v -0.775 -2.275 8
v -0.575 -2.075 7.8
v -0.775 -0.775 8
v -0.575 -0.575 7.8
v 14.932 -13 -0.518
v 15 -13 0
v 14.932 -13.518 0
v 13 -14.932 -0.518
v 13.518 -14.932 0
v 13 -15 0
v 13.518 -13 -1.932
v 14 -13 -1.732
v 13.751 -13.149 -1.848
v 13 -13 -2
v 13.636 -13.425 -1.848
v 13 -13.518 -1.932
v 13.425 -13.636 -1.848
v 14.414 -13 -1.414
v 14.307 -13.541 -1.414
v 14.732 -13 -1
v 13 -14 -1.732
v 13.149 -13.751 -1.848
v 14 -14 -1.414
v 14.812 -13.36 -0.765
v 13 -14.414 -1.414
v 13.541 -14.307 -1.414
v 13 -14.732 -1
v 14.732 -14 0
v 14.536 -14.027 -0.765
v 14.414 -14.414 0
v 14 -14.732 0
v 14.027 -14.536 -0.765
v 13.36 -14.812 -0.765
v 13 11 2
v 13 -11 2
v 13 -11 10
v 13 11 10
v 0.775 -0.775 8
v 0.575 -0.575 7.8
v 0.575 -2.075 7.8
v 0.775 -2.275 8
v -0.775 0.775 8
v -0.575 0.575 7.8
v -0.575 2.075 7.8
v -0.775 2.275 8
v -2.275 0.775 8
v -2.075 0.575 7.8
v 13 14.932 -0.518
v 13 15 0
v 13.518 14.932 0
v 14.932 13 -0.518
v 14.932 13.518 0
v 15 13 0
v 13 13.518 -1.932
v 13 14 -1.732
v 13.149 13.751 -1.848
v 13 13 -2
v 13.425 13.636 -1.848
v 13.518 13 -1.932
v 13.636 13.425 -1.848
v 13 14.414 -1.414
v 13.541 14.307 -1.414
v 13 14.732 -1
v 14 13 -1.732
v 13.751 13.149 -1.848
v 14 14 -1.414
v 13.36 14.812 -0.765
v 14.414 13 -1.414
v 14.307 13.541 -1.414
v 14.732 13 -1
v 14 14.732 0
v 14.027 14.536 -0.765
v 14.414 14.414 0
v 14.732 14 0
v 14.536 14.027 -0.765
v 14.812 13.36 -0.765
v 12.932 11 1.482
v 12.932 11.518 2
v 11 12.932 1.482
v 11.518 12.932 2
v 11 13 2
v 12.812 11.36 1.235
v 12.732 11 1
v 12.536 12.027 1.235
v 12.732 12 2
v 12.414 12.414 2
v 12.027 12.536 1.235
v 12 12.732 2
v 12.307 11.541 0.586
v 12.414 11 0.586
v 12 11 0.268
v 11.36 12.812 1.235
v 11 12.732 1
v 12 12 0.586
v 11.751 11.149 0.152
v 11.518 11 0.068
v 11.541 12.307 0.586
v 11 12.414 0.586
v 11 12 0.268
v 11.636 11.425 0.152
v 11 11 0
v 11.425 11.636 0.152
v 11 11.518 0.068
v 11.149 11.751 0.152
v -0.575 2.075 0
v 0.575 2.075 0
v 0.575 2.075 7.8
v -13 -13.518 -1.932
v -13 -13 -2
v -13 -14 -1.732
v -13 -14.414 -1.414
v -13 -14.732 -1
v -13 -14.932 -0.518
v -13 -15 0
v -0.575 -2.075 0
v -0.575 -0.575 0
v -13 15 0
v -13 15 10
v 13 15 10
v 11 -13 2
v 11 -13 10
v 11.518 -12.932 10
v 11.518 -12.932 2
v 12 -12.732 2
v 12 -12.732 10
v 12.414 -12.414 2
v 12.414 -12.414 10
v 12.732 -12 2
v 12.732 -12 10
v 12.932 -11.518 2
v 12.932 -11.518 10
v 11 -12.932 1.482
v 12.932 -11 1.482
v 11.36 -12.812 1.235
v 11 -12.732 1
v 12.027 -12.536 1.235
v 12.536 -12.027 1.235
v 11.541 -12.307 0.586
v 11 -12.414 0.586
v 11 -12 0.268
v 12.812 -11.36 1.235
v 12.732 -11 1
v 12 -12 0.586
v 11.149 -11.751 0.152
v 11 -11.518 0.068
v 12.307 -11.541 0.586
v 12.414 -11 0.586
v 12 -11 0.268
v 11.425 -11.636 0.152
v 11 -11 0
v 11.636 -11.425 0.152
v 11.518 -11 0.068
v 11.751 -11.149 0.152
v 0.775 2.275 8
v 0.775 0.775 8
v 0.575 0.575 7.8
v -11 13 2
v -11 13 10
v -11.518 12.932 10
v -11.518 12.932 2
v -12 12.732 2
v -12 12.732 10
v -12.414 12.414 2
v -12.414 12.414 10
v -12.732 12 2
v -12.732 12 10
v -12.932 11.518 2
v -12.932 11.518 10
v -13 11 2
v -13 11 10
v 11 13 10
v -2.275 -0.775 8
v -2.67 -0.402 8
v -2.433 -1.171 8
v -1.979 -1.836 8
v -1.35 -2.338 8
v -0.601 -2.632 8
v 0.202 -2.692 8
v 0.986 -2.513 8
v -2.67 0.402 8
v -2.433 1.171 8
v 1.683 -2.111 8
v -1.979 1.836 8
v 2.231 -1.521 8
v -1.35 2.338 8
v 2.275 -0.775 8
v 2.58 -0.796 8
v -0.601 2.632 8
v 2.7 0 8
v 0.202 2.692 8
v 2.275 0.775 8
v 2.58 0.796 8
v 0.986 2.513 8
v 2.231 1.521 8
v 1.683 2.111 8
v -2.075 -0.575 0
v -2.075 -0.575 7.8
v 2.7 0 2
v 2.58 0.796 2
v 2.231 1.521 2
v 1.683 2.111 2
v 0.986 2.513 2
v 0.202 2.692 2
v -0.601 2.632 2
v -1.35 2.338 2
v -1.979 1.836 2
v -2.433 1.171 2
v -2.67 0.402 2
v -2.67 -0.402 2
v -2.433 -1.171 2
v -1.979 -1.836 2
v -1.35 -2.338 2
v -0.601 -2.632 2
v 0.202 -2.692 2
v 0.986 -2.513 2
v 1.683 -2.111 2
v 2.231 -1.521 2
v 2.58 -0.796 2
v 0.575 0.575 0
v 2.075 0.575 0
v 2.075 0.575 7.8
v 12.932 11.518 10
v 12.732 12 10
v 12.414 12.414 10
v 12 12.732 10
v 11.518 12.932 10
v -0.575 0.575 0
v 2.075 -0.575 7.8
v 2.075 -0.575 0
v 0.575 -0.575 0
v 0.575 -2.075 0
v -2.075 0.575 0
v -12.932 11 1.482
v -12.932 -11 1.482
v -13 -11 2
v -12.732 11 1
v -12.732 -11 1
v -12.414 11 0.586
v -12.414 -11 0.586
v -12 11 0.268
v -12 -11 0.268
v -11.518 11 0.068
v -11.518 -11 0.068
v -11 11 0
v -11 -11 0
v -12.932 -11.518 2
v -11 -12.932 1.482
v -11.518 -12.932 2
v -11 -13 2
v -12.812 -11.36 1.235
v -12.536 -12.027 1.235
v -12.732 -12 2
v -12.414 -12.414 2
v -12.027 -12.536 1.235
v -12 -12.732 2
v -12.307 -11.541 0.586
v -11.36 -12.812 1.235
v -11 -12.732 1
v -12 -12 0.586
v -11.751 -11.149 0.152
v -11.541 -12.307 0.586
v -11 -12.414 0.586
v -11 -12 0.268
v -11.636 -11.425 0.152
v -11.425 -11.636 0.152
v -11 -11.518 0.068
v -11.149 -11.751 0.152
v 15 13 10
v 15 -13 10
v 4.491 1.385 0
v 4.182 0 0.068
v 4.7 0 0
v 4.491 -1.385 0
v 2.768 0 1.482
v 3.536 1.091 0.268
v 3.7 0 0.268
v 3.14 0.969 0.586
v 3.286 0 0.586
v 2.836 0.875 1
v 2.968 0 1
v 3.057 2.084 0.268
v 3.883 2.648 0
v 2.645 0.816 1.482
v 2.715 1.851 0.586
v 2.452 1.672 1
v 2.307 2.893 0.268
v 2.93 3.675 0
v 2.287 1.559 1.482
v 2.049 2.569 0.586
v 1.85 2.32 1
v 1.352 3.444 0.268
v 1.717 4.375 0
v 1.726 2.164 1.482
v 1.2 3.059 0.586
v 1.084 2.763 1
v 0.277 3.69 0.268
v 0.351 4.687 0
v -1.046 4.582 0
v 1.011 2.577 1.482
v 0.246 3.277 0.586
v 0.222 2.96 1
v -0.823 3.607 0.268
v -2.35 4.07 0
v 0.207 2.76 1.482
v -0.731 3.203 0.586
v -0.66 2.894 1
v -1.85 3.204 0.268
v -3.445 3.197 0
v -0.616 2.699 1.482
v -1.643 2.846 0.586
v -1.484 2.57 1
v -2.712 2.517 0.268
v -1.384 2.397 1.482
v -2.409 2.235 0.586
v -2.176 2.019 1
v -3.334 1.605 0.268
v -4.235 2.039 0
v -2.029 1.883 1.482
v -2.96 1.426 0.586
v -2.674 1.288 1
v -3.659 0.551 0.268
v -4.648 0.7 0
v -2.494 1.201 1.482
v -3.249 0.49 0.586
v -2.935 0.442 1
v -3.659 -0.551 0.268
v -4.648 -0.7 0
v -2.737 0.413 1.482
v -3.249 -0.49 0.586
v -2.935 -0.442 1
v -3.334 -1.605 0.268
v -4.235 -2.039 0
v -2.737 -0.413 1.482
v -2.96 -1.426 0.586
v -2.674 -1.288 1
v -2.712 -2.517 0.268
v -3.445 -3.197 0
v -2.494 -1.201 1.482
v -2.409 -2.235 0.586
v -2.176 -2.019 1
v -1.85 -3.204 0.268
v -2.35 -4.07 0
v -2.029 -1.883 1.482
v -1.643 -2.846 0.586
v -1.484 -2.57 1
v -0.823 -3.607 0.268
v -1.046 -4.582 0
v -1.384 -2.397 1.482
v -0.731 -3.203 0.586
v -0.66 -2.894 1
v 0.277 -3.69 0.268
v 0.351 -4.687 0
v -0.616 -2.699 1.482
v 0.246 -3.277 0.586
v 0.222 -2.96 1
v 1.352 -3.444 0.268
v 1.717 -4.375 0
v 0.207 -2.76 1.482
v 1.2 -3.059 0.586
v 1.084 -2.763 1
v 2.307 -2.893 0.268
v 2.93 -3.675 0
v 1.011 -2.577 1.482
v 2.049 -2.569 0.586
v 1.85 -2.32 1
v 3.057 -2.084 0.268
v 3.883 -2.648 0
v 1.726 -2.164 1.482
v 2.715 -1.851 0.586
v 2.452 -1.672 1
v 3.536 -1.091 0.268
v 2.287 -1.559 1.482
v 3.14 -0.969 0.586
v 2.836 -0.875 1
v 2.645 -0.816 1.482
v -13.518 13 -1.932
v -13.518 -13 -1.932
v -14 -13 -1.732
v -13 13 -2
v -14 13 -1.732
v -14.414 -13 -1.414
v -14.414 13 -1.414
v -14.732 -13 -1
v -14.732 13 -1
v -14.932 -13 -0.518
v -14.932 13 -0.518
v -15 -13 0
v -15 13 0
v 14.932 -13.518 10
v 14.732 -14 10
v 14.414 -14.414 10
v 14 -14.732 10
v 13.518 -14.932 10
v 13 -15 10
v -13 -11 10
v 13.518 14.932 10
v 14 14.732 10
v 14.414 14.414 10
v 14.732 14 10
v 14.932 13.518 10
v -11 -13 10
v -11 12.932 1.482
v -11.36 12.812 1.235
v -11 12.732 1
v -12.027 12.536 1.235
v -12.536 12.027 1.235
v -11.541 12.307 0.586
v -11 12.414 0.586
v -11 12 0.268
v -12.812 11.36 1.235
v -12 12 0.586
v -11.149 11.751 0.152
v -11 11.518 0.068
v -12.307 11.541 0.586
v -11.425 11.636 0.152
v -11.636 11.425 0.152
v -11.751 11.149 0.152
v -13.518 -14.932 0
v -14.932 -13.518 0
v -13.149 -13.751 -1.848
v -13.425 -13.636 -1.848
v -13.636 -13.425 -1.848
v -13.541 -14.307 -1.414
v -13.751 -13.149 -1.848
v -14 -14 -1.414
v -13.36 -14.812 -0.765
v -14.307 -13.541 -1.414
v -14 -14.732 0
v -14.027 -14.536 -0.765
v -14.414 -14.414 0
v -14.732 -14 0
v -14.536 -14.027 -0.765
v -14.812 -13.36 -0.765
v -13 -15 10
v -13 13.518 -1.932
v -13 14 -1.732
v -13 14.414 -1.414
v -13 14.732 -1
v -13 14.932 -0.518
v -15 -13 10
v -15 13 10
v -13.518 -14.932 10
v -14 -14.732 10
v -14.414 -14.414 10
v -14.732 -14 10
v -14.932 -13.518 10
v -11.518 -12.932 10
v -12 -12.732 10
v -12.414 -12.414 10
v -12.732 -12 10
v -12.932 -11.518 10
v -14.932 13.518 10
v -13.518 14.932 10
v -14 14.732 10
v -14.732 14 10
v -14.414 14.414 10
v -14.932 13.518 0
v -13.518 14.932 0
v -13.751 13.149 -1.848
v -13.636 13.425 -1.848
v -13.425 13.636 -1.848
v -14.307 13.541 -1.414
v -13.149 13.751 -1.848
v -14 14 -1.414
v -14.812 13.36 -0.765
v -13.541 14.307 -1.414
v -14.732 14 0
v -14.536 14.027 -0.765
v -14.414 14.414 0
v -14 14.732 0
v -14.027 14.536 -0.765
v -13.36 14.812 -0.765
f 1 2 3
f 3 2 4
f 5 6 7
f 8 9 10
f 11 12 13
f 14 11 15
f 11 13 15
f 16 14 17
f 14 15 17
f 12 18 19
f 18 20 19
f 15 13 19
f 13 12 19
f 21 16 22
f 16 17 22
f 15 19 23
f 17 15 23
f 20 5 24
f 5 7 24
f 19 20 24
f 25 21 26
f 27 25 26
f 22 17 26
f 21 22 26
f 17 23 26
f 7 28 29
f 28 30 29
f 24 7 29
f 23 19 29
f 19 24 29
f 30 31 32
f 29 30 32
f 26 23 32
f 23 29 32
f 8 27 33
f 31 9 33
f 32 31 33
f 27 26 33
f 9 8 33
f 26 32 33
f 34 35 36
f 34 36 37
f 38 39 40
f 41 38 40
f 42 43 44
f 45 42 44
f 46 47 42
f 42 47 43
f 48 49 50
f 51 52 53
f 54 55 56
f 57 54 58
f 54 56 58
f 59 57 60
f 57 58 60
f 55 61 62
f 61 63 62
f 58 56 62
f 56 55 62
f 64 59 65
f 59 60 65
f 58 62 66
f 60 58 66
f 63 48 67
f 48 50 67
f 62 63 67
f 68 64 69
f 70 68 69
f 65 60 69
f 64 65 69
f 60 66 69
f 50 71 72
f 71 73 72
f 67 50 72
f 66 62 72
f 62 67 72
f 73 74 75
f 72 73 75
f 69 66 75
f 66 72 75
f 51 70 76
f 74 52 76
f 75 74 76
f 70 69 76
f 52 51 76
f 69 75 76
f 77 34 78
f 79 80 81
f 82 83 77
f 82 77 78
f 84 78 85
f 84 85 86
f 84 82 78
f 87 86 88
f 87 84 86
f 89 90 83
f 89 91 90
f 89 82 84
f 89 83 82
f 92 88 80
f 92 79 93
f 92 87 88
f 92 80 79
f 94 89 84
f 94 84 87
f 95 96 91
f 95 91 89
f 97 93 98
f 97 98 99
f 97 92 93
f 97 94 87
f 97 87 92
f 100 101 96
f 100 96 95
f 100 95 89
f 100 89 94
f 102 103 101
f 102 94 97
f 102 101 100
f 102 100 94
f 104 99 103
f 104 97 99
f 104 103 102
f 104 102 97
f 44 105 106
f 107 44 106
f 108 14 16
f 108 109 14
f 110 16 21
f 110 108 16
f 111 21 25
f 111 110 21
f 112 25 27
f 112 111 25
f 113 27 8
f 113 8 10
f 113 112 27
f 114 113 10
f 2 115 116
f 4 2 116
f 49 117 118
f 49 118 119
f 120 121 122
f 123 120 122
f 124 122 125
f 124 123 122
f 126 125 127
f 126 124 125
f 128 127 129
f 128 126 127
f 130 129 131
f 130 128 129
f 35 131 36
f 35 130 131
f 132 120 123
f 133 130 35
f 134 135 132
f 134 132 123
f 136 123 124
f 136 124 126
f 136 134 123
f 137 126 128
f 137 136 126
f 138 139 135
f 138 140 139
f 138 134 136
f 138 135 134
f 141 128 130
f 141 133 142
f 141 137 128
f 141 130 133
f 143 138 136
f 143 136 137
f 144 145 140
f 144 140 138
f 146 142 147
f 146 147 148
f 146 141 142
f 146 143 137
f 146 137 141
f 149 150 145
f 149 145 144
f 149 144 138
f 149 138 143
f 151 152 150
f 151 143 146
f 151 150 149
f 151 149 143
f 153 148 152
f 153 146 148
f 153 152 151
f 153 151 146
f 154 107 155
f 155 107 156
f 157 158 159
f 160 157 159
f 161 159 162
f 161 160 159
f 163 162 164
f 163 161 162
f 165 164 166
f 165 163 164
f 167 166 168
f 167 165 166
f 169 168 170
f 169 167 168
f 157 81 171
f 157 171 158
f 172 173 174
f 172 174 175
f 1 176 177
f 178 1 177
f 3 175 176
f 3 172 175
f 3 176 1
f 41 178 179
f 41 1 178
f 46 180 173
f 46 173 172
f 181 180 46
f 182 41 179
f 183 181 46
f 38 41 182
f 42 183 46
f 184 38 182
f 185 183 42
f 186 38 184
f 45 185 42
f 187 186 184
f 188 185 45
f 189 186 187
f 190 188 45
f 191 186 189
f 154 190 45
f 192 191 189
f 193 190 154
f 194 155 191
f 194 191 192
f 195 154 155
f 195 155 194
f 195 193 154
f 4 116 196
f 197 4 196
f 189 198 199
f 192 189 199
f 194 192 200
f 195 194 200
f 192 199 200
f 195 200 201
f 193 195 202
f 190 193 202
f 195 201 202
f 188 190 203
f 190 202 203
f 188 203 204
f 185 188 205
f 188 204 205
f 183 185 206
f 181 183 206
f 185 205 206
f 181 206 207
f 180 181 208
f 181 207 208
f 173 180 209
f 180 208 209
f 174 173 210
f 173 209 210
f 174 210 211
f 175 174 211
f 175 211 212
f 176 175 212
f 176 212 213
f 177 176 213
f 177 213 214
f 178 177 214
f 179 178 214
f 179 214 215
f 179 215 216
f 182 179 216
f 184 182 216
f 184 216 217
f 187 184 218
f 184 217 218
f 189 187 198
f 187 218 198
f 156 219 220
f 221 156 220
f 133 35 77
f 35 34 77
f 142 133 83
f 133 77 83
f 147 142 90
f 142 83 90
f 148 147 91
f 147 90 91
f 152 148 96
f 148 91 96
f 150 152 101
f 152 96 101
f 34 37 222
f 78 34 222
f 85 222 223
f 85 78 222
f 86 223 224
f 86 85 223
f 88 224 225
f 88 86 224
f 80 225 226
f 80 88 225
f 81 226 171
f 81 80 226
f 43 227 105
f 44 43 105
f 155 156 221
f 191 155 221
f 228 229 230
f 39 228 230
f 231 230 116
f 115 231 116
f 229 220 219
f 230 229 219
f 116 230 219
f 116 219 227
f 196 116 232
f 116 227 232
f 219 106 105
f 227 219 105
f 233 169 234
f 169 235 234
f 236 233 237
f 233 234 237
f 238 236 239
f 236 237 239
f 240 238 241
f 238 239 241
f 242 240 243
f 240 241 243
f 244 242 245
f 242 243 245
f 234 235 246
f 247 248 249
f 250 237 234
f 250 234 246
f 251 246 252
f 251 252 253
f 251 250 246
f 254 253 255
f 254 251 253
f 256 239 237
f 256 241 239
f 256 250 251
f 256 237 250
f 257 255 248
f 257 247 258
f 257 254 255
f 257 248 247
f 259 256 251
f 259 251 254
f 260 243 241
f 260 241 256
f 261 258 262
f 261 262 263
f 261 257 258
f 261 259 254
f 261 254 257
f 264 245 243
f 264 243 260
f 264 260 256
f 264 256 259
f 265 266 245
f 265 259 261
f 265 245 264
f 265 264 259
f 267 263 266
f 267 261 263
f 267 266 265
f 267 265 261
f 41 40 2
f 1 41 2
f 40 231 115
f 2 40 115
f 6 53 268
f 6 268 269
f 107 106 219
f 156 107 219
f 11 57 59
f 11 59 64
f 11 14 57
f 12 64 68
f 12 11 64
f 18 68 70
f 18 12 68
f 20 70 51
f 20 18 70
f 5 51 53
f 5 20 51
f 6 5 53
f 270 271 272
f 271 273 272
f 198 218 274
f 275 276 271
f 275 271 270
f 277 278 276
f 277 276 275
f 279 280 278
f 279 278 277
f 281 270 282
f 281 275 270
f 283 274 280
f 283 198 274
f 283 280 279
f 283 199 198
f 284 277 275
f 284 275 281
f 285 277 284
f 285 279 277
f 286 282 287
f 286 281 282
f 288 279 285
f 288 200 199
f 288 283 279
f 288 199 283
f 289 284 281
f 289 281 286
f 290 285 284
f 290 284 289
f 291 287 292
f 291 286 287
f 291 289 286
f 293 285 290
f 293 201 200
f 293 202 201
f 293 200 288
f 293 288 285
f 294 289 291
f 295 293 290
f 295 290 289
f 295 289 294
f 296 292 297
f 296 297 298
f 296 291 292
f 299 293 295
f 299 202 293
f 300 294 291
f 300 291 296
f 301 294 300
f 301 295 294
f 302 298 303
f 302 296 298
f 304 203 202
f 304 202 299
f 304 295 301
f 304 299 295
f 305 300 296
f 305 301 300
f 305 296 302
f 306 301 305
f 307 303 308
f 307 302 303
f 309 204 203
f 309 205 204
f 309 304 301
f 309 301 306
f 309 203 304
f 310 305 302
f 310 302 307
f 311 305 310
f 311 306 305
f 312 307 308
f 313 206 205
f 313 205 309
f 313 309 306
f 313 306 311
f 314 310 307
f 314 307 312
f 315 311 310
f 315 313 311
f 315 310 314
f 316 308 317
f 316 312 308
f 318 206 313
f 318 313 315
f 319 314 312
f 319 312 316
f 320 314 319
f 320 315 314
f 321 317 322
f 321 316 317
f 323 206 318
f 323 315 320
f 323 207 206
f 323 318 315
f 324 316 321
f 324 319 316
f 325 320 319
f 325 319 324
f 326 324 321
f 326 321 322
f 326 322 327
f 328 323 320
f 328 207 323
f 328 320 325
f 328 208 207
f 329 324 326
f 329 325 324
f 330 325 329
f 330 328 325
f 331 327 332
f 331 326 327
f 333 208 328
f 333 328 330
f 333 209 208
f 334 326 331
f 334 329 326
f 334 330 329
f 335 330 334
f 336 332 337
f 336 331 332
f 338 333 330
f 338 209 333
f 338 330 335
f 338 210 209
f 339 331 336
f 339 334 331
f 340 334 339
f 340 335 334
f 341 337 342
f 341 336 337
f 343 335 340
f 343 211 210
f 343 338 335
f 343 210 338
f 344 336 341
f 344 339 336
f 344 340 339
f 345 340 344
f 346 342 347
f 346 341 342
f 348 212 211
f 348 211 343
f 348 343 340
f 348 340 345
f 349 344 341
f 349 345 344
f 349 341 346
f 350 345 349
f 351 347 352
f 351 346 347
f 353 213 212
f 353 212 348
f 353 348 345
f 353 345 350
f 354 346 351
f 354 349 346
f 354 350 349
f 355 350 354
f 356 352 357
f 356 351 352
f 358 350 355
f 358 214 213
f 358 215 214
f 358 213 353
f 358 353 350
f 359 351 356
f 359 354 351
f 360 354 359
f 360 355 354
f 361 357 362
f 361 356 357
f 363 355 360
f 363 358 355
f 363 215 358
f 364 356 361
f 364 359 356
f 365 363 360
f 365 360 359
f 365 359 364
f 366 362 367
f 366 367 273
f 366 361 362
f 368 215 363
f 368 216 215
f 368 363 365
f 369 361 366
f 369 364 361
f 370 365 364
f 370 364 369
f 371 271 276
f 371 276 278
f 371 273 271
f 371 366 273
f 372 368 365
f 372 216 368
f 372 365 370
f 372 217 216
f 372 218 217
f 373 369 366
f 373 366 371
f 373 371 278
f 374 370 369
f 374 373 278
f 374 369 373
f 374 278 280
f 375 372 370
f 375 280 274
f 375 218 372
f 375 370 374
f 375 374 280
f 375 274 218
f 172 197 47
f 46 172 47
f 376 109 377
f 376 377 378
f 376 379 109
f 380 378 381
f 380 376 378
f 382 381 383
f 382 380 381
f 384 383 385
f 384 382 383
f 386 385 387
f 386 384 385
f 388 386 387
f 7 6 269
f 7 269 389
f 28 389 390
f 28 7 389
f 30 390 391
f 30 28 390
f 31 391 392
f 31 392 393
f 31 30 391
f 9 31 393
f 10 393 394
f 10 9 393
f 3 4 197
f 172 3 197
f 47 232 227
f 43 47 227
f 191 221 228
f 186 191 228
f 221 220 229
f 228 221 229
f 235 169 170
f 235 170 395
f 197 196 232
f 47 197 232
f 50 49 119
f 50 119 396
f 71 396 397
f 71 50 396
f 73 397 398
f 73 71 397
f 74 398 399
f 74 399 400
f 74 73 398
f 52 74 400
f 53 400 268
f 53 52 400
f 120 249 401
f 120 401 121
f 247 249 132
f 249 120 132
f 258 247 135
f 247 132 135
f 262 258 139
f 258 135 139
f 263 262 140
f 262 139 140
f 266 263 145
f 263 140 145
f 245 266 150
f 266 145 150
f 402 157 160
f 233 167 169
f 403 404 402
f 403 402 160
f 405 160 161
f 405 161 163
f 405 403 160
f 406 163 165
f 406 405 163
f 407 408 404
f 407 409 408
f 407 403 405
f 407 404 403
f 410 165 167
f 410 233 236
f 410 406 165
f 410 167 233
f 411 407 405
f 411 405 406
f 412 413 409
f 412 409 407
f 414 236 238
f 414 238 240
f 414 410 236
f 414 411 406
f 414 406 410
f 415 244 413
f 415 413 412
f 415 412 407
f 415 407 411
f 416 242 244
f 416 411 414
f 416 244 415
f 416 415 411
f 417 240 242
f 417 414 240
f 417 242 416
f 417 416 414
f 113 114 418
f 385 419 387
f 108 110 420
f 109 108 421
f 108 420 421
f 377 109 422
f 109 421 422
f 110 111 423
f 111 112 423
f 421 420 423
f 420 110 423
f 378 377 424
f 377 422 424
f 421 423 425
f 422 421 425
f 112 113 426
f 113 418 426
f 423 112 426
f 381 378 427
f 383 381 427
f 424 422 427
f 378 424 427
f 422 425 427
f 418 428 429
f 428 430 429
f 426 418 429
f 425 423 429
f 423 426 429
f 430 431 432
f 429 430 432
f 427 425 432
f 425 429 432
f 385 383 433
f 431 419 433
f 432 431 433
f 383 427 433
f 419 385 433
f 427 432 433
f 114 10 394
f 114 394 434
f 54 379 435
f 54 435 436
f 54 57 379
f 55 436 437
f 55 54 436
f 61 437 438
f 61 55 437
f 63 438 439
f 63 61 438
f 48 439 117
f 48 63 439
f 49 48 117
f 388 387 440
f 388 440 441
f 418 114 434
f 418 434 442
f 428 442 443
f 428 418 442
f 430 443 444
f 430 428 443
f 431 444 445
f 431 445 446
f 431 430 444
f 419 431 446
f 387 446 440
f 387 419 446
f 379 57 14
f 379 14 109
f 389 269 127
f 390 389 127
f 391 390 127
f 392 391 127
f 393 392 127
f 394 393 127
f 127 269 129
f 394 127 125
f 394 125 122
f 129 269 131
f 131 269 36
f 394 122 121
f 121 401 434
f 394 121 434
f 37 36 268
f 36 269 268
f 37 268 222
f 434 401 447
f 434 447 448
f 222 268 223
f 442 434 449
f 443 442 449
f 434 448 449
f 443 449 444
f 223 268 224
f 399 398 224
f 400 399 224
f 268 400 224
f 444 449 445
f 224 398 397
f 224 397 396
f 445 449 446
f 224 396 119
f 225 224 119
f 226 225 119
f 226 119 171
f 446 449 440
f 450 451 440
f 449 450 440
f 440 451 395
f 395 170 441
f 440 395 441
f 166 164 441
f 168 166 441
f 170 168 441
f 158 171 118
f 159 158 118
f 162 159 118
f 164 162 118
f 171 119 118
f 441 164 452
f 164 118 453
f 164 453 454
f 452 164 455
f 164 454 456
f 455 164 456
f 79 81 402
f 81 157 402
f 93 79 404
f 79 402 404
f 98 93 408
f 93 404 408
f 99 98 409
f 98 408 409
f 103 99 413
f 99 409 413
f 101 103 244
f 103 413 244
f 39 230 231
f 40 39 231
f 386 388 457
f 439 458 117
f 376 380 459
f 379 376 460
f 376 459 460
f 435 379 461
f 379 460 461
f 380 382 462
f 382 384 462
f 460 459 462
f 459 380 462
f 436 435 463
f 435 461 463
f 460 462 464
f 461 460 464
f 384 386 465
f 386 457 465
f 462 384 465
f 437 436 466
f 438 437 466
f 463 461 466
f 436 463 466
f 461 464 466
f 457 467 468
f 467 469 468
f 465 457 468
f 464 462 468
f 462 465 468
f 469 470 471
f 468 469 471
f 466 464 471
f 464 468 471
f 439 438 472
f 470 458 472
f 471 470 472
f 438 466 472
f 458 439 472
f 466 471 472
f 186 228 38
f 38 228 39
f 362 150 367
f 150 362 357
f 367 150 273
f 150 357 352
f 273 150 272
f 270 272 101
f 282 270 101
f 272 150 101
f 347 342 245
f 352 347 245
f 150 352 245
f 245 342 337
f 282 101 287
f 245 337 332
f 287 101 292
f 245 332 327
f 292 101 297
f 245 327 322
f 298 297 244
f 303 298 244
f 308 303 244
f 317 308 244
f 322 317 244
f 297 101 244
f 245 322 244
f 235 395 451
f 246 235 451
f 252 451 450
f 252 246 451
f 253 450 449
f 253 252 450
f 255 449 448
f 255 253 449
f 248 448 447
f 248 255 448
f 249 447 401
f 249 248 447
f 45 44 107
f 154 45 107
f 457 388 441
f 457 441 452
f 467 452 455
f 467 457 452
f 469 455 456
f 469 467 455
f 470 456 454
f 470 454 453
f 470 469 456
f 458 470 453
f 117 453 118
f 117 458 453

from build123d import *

# Parameters (mm, degrees)
EXTRUDE_1_DEPTH = 10
SKETCH_1_6_R    = 2.7
EXTRUDE_2_DEPTH = 8
EXTRUDE_START   = -2
EXTRUDE_3_DEPTH = 2
FILLET_1_R      = 2
FILLET_5_R      = 2
CHAMFER_1_SIZE  = 0.2


with BuildPart() as part:
    # 草图1 → 凸台-拉伸1 (new body)
    with BuildSketch(Plane.XY):
        with BuildLine():
            Line((13, 15), (-13, 15))
            ThreePointArc((-13, 15), (-14.414213562, 14.414213562), (-15, 13))
            Line((-15, 13), (-15, -13))
            ThreePointArc((-15, -13), (-14.414213562, -14.414213562), (-13, -15))
            Line((-13, -15), (13, -15))
            ThreePointArc((13, -15), (14.414213562, -14.414213562), (15, -13))
            Line((15, -13), (15, 13))
            ThreePointArc((15, 13), (14.414213562, 14.414213562), (13, 15))
        make_face()
        with BuildLine():
            ThreePointArc((-13, 11), (-12.414213562, 12.414213562), (-11, 13))
            Line((-11, 13), (11, 13))
            ThreePointArc((11, 13), (12.414213562, 12.414213562), (13, 11))
            Line((13, 11), (13, -11))
            ThreePointArc((13, -11), (12.414213562, -12.414213562), (11, -13))
            Line((11, -13), (-11, -13))
            ThreePointArc((-11, -13), (-12.414213562, -12.414213562), (-13, -11))
            Line((-13, -11), (-13, 11))
        make_face(mode=Mode.SUBTRACT)
    extrude(amount=EXTRUDE_1_DEPTH)



with BuildPart() as body_2:
    # 草图1<6> → 凸台-拉伸2 (new body)
    with BuildSketch(Plane.XY):
        Circle(SKETCH_1_6_R)
        Polygon((-2.075, -0.575), (-2.075, 0.575), (-0.575, 0.575), (-0.575, 2.075), (0.575, 2.075), (0.575, 0.575), (2.075, 0.575), (2.075, -0.575), (0.575, -0.575), (0.575, -2.075), (-0.575, -2.075), (-0.575, -0.575), align=None, mode=Mode.SUBTRACT)
    extrude(amount=EXTRUDE_2_DEPTH)


with BuildPart() as part_1:
    add(part.part)

    add(body_2.part)  # 凸台-拉伸3 merges body 2
    # 草图1<7> → 凸台-拉伸3 (add)
    with BuildSketch(Plane.XY.offset(EXTRUDE_START)):
        with BuildLine():
            Line((-13, 15), (13, 15))
            ThreePointArc((13, 15), (14.414213562, 14.414213562), (15, 13))
            Line((15, 13), (15, -13))
            ThreePointArc((15, -13), (14.414213562, -14.414213562), (13, -15))
            Line((13, -15), (-13, -15))
            ThreePointArc((-13, -15), (-14.414213562, -14.414213562), (-15, -13))
            Line((-15, -13), (-15, 13))
            ThreePointArc((-15, 13), (-14.414213562, 14.414213562), (-13, 15))
        make_face()
    extrude(amount=EXTRUDE_3_DEPTH)

    # 圆角1
    fillet_1_edges = [part_1.edges().sort_by_distance(p)[0] for p in [
        (-14.414213562, 14.414213562, -2),
        (-15, 0, -2),
        (-14.414213562, -14.414213562, -2),
        (0, -15, -2),
        (14.414213562, -14.414213562, -2),
        (15, 0, -2),
        (14.414213562, 14.414213562, -2),
        (0, 15, -2),
    ]]
    fillet(fillet_1_edges, radius=FILLET_1_R)

    # 圆角5
    fillet_5_edges = [part_1.edges().sort_by_distance(p)[0] for p in [
        (-12.414213562, 12.414213562, 0),
        (0, 13, 0),
        (12.414213562, 12.414213562, 0),
        (13, 0, 0),
        (12.414213562, -12.414213562, 0),
        (0, -13, 0),
        (-12.414213562, -12.414213562, 0),
        (-13, 0, 0),
        (-2.7, 0, 0),
    ]]
    fillet(fillet_5_edges, radius=FILLET_5_R)

    # 倒角1
    chamfer_1_edges = [part_1.edges().sort_by_distance(p)[0] for p in [
        (-0.575, 1.325, 8),
        (-1.325, 0.575, 8),
        (-2.075, 0, 8),
        (-1.325, -0.575, 8),
        (-0.575, -1.325, 8),
        (0, -2.075, 8),
        (0.575, -1.325, 8),
        (1.325, -0.575, 8),
        (2.075, 0, 8),
        (1.325, 0.575, 8),
        (0.575, 1.325, 8),
        (0, 2.075, 8),
    ]]
    chamfer(chamfer_1_edges, length=CHAMFER_1_SIZE)


solid = part_1.part
